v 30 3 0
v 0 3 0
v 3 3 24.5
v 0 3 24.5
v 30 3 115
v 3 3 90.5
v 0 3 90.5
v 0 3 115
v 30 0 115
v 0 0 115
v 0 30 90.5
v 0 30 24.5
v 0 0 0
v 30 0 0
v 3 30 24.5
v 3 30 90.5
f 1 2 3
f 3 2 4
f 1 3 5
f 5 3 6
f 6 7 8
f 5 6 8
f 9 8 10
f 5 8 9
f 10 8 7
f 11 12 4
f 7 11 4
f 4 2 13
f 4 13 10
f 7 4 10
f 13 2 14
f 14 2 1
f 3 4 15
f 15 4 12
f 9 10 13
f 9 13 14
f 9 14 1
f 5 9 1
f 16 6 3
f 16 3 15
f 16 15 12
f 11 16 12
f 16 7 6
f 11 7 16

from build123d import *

# Parameters (mm, degrees)
EXTRUDE_1_DEPTH     = 115
SKETCH_2_W          = 24.5
SKETCH_2_H          = 27
CUT_EXTRUDE_1_DEPTH = 31


with BuildPart() as part:
    # Эскиз1 → Бобышка-Вытянуть1 (new body)
    with BuildSketch(Plane.XY):
        Polygon((0, 30), (0, 0), (30, 0), (30, 3), (3, 3), (3, 30), align=None)
    extrude(amount=EXTRUDE_1_DEPTH)

    # Эскиз2 → Вырез-Вытянуть1 (cut, through all)
    with BuildSketch(Plane.ZY):
        with Locations((12.25, 16.5)):
            Rectangle(SKETCH_2_W, SKETCH_2_H)
        with Locations((102.75, 16.5)):
            Rectangle(SKETCH_2_W, SKETCH_2_H)
    extrude(amount=-CUT_EXTRUDE_1_DEPTH, mode=Mode.SUBTRACT)


solid = part.part
